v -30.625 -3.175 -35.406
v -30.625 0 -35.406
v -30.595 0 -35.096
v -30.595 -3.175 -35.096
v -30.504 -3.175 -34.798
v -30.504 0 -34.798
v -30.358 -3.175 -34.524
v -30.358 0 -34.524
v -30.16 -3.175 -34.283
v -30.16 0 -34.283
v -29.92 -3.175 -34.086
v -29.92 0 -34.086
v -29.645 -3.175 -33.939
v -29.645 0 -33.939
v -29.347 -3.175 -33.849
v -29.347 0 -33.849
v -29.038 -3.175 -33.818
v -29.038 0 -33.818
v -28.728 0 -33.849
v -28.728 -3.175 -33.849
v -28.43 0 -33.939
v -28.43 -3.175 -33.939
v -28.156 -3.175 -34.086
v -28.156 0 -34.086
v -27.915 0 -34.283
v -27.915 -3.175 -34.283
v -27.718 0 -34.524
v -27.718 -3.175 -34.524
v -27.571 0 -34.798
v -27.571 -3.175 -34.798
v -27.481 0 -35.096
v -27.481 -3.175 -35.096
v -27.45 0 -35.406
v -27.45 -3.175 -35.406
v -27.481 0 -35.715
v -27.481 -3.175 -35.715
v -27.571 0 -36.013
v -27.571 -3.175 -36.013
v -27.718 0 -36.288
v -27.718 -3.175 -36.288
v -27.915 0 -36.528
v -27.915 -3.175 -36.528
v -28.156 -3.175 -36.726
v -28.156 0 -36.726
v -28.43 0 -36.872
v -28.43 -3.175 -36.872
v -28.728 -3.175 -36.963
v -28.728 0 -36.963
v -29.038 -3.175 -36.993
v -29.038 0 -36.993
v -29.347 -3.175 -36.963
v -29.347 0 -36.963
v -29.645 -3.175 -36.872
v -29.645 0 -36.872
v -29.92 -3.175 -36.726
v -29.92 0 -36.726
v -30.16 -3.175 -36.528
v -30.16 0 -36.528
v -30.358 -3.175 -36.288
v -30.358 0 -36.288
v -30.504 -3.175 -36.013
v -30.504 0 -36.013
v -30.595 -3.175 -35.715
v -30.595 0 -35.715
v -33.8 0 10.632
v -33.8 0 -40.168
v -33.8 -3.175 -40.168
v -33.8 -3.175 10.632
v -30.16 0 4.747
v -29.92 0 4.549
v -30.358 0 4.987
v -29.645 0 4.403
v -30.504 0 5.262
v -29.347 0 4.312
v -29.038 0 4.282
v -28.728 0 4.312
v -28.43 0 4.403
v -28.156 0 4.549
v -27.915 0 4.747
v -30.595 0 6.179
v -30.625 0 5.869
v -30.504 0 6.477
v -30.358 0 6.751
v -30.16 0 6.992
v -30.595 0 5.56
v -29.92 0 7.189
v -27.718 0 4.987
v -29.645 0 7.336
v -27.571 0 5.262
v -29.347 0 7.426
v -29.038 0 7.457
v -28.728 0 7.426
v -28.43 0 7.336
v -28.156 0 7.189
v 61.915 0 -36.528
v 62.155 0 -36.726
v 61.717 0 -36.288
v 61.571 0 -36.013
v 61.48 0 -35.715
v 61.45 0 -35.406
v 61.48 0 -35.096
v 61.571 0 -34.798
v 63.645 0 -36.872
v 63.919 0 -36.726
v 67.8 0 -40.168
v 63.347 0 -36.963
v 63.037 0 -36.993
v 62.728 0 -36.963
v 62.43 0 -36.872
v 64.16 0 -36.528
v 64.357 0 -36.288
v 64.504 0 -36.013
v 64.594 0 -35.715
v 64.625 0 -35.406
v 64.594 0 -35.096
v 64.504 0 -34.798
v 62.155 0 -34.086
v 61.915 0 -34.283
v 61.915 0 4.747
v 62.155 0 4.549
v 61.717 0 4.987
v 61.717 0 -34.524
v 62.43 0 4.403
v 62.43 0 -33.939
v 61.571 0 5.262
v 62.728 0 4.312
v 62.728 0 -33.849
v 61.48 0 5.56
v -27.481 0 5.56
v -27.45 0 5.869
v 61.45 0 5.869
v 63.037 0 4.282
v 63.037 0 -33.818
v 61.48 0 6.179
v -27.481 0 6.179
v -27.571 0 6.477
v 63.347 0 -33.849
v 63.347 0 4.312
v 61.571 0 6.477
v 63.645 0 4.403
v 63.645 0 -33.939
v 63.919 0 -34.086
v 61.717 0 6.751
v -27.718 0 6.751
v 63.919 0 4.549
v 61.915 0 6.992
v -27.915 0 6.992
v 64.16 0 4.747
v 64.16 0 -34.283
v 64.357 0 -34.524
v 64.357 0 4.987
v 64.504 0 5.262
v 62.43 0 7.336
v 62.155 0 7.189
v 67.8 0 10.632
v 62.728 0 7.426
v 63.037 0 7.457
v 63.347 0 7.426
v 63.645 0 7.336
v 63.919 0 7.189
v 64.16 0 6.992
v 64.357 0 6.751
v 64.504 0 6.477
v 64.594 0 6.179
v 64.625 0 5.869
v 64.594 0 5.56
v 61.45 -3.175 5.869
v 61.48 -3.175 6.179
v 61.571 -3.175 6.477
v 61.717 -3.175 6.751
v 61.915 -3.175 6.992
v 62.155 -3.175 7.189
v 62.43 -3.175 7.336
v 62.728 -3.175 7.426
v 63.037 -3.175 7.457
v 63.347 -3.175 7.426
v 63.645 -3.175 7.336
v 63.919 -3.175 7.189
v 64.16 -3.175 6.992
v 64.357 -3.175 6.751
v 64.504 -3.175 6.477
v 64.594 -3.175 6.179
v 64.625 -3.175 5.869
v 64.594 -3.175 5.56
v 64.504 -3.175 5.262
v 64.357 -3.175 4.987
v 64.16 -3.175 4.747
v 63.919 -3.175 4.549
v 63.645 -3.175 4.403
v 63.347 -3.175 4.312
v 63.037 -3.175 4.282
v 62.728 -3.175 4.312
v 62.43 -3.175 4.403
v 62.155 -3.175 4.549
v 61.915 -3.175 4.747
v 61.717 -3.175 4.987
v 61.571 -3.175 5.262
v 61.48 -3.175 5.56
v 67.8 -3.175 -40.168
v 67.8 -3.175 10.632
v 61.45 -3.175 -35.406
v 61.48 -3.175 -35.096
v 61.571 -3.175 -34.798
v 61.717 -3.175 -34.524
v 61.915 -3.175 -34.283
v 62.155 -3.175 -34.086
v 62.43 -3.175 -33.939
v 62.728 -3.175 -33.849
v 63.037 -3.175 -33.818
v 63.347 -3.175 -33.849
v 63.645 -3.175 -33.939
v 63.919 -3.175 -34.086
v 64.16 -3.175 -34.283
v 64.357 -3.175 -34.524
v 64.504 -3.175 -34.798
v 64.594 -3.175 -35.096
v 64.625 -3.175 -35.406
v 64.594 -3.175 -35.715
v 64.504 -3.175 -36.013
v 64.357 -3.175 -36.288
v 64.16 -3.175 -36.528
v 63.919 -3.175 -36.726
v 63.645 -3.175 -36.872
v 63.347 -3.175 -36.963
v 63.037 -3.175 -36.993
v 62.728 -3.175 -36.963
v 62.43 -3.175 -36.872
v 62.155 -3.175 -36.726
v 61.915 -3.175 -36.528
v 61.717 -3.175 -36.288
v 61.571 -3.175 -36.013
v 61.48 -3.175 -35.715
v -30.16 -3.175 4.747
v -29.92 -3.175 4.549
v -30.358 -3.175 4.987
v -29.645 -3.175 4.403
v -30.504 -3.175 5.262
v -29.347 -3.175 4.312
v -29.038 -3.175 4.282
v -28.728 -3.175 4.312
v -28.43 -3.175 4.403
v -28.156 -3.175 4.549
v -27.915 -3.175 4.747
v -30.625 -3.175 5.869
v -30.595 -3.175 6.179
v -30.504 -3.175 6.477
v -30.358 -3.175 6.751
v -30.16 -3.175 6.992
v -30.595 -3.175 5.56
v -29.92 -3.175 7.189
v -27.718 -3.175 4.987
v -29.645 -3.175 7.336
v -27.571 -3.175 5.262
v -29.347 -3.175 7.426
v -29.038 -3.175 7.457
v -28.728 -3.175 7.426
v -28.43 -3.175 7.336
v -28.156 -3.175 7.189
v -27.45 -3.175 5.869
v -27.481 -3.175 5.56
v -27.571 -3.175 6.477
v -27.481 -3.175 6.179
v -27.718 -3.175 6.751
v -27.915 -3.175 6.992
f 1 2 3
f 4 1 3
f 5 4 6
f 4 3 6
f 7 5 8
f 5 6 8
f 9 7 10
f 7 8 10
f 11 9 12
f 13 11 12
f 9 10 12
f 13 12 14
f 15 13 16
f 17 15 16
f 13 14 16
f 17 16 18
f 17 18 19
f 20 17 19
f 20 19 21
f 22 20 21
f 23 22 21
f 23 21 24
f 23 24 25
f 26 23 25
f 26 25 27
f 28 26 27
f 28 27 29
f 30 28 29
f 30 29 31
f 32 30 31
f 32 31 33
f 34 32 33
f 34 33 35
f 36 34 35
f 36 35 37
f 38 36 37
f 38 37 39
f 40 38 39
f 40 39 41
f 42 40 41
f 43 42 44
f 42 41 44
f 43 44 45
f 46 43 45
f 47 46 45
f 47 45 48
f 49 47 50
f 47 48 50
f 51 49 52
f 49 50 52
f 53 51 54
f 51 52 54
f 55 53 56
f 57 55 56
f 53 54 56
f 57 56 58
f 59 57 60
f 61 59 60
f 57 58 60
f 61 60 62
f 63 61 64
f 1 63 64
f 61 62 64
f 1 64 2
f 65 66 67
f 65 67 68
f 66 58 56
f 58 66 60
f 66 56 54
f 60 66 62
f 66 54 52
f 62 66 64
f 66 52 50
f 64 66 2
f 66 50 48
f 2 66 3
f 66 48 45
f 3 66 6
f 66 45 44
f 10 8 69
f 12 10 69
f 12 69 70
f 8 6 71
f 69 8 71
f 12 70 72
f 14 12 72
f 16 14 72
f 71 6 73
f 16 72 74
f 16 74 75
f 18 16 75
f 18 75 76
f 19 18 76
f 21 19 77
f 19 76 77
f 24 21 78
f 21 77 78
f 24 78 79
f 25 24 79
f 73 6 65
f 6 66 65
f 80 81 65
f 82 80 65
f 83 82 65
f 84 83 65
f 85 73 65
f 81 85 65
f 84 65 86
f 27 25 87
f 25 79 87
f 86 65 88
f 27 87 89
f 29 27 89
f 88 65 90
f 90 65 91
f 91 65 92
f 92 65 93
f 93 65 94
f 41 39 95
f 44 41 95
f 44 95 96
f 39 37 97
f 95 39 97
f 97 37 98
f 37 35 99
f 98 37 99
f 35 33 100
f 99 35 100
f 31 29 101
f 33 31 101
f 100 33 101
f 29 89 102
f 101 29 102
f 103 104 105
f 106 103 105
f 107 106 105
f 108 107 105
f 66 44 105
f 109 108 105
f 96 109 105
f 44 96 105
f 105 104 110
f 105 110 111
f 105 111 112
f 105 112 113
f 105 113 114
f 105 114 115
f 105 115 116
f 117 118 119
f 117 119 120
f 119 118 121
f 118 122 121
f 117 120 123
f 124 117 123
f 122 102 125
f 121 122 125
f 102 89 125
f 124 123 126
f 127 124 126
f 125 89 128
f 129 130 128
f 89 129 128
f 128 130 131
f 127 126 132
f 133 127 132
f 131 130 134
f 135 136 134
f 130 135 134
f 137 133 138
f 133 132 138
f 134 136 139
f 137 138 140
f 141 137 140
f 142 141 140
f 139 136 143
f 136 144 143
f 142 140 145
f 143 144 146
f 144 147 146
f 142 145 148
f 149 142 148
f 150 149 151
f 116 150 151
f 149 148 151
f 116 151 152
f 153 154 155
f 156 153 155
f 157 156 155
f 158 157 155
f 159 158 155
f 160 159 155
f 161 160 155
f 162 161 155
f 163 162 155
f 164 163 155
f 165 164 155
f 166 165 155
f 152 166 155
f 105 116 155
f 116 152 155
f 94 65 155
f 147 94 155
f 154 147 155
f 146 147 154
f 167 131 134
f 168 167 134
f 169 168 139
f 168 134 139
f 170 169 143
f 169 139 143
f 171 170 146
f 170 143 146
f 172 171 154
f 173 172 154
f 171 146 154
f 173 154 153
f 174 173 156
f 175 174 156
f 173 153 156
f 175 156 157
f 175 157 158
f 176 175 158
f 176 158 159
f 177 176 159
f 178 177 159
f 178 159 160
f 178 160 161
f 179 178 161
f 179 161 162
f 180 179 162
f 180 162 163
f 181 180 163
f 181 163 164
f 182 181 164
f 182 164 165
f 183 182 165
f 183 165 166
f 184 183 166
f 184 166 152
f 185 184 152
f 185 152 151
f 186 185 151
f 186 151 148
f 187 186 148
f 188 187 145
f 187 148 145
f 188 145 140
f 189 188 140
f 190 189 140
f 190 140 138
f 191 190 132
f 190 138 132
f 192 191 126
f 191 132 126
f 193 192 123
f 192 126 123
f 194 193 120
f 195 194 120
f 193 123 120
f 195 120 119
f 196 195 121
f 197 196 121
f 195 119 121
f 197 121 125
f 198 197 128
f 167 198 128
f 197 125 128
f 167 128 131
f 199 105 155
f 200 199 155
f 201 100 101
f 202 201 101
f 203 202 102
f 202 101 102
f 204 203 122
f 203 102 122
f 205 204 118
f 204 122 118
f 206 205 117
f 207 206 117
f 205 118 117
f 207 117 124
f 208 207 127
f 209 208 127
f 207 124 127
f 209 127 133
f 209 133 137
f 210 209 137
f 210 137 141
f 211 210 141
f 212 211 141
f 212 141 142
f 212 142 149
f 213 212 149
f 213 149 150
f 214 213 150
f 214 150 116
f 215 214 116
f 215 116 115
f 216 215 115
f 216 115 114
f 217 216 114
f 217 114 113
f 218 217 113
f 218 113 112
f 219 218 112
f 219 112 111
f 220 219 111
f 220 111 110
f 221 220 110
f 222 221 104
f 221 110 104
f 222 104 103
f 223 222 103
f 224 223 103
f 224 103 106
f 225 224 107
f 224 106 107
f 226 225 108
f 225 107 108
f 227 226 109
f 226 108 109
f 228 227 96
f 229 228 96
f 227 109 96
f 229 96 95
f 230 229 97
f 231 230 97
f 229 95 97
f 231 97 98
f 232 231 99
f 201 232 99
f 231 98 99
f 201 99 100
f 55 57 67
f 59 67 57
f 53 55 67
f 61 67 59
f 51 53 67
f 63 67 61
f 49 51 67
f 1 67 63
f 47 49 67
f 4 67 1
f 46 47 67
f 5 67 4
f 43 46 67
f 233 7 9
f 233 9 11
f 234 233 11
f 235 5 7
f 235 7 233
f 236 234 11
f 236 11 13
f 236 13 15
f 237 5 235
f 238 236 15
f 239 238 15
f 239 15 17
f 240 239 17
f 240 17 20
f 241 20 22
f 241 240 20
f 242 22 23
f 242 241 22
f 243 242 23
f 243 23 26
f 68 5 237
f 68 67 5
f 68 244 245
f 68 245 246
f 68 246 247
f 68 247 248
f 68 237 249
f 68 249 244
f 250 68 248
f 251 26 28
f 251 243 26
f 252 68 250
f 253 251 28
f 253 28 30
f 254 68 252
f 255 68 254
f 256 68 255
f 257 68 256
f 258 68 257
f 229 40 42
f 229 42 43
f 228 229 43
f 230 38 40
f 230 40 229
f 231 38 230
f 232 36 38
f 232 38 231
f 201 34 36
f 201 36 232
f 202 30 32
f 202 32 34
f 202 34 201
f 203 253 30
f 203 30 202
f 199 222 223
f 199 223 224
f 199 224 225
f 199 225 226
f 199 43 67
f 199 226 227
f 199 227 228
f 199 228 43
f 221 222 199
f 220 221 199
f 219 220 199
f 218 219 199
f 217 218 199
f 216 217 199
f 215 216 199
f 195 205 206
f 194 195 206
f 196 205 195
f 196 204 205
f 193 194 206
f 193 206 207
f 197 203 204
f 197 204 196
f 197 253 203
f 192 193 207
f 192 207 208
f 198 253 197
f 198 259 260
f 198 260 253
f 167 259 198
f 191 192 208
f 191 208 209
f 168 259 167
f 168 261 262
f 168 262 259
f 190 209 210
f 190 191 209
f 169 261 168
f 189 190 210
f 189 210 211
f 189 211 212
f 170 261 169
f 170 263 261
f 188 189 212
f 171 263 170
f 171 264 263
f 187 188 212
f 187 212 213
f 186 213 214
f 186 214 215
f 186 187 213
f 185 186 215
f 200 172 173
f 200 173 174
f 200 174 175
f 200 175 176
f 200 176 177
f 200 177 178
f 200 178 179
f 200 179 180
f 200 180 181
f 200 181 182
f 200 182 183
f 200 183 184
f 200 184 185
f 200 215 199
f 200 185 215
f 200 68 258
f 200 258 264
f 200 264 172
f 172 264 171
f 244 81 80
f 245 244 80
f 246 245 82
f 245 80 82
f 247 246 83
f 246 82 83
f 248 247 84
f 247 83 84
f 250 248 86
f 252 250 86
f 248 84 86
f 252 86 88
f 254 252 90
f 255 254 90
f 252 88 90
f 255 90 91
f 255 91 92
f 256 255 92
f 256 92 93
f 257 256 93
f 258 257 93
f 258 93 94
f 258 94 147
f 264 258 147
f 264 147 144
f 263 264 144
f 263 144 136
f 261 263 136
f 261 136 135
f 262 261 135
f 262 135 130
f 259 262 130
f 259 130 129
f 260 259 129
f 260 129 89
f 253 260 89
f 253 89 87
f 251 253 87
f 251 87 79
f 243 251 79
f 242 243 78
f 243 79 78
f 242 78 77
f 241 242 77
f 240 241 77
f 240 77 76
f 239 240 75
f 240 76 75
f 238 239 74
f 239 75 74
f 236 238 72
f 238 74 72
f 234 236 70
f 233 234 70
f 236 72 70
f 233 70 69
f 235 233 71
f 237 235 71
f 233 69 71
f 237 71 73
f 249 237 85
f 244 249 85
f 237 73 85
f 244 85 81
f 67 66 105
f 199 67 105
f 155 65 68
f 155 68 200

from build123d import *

# Parameters (mm, degrees)
F0_W     = 101.6
F0_H     = 50.8
F1_DEPTH = 3.175
F2_R     = 1.5875
F3_DEPTH = 25.4
F4_R     = 3.175568
F5_DEPTH = 25.4


with BuildPart() as f1:
    # F0 (on Front) → F1 (new body)
    with BuildSketch(Plane.XZ):
        with Locations((16.999856, -14.768285)):
            Rectangle(F0_W, F0_H)
    extrude(amount=F1_DEPTH)

    # F2 (on face) → F3 (cut)
    with BuildSketch(Plane(origin=(0, 0, 0), x_dir=(-1, 0, 0), z_dir=(0, 1, 0))):
        with Locations((-63.037356, 5.869215)):
            Circle(F2_R)
        with Locations((-63.037356, -35.405785)):
            Circle(F2_R)
        with Locations((29.037644, 5.869215)):
            Circle(F2_R)
        with Locations((29.037644, -35.405785)):
            Circle(F2_R)
    extrude(amount=-F3_DEPTH, mode=Mode.SUBTRACT)

    # F4 (on face) → F5 (cut)
    with BuildSketch(Plane.XZ.offset(3.175)):
        with Locations((25.4, -20.161087)):
            Circle(F4_R)
    extrude(amount=F5_DEPTH, mode=Mode.SUBTRACT)


solid = f1.part
